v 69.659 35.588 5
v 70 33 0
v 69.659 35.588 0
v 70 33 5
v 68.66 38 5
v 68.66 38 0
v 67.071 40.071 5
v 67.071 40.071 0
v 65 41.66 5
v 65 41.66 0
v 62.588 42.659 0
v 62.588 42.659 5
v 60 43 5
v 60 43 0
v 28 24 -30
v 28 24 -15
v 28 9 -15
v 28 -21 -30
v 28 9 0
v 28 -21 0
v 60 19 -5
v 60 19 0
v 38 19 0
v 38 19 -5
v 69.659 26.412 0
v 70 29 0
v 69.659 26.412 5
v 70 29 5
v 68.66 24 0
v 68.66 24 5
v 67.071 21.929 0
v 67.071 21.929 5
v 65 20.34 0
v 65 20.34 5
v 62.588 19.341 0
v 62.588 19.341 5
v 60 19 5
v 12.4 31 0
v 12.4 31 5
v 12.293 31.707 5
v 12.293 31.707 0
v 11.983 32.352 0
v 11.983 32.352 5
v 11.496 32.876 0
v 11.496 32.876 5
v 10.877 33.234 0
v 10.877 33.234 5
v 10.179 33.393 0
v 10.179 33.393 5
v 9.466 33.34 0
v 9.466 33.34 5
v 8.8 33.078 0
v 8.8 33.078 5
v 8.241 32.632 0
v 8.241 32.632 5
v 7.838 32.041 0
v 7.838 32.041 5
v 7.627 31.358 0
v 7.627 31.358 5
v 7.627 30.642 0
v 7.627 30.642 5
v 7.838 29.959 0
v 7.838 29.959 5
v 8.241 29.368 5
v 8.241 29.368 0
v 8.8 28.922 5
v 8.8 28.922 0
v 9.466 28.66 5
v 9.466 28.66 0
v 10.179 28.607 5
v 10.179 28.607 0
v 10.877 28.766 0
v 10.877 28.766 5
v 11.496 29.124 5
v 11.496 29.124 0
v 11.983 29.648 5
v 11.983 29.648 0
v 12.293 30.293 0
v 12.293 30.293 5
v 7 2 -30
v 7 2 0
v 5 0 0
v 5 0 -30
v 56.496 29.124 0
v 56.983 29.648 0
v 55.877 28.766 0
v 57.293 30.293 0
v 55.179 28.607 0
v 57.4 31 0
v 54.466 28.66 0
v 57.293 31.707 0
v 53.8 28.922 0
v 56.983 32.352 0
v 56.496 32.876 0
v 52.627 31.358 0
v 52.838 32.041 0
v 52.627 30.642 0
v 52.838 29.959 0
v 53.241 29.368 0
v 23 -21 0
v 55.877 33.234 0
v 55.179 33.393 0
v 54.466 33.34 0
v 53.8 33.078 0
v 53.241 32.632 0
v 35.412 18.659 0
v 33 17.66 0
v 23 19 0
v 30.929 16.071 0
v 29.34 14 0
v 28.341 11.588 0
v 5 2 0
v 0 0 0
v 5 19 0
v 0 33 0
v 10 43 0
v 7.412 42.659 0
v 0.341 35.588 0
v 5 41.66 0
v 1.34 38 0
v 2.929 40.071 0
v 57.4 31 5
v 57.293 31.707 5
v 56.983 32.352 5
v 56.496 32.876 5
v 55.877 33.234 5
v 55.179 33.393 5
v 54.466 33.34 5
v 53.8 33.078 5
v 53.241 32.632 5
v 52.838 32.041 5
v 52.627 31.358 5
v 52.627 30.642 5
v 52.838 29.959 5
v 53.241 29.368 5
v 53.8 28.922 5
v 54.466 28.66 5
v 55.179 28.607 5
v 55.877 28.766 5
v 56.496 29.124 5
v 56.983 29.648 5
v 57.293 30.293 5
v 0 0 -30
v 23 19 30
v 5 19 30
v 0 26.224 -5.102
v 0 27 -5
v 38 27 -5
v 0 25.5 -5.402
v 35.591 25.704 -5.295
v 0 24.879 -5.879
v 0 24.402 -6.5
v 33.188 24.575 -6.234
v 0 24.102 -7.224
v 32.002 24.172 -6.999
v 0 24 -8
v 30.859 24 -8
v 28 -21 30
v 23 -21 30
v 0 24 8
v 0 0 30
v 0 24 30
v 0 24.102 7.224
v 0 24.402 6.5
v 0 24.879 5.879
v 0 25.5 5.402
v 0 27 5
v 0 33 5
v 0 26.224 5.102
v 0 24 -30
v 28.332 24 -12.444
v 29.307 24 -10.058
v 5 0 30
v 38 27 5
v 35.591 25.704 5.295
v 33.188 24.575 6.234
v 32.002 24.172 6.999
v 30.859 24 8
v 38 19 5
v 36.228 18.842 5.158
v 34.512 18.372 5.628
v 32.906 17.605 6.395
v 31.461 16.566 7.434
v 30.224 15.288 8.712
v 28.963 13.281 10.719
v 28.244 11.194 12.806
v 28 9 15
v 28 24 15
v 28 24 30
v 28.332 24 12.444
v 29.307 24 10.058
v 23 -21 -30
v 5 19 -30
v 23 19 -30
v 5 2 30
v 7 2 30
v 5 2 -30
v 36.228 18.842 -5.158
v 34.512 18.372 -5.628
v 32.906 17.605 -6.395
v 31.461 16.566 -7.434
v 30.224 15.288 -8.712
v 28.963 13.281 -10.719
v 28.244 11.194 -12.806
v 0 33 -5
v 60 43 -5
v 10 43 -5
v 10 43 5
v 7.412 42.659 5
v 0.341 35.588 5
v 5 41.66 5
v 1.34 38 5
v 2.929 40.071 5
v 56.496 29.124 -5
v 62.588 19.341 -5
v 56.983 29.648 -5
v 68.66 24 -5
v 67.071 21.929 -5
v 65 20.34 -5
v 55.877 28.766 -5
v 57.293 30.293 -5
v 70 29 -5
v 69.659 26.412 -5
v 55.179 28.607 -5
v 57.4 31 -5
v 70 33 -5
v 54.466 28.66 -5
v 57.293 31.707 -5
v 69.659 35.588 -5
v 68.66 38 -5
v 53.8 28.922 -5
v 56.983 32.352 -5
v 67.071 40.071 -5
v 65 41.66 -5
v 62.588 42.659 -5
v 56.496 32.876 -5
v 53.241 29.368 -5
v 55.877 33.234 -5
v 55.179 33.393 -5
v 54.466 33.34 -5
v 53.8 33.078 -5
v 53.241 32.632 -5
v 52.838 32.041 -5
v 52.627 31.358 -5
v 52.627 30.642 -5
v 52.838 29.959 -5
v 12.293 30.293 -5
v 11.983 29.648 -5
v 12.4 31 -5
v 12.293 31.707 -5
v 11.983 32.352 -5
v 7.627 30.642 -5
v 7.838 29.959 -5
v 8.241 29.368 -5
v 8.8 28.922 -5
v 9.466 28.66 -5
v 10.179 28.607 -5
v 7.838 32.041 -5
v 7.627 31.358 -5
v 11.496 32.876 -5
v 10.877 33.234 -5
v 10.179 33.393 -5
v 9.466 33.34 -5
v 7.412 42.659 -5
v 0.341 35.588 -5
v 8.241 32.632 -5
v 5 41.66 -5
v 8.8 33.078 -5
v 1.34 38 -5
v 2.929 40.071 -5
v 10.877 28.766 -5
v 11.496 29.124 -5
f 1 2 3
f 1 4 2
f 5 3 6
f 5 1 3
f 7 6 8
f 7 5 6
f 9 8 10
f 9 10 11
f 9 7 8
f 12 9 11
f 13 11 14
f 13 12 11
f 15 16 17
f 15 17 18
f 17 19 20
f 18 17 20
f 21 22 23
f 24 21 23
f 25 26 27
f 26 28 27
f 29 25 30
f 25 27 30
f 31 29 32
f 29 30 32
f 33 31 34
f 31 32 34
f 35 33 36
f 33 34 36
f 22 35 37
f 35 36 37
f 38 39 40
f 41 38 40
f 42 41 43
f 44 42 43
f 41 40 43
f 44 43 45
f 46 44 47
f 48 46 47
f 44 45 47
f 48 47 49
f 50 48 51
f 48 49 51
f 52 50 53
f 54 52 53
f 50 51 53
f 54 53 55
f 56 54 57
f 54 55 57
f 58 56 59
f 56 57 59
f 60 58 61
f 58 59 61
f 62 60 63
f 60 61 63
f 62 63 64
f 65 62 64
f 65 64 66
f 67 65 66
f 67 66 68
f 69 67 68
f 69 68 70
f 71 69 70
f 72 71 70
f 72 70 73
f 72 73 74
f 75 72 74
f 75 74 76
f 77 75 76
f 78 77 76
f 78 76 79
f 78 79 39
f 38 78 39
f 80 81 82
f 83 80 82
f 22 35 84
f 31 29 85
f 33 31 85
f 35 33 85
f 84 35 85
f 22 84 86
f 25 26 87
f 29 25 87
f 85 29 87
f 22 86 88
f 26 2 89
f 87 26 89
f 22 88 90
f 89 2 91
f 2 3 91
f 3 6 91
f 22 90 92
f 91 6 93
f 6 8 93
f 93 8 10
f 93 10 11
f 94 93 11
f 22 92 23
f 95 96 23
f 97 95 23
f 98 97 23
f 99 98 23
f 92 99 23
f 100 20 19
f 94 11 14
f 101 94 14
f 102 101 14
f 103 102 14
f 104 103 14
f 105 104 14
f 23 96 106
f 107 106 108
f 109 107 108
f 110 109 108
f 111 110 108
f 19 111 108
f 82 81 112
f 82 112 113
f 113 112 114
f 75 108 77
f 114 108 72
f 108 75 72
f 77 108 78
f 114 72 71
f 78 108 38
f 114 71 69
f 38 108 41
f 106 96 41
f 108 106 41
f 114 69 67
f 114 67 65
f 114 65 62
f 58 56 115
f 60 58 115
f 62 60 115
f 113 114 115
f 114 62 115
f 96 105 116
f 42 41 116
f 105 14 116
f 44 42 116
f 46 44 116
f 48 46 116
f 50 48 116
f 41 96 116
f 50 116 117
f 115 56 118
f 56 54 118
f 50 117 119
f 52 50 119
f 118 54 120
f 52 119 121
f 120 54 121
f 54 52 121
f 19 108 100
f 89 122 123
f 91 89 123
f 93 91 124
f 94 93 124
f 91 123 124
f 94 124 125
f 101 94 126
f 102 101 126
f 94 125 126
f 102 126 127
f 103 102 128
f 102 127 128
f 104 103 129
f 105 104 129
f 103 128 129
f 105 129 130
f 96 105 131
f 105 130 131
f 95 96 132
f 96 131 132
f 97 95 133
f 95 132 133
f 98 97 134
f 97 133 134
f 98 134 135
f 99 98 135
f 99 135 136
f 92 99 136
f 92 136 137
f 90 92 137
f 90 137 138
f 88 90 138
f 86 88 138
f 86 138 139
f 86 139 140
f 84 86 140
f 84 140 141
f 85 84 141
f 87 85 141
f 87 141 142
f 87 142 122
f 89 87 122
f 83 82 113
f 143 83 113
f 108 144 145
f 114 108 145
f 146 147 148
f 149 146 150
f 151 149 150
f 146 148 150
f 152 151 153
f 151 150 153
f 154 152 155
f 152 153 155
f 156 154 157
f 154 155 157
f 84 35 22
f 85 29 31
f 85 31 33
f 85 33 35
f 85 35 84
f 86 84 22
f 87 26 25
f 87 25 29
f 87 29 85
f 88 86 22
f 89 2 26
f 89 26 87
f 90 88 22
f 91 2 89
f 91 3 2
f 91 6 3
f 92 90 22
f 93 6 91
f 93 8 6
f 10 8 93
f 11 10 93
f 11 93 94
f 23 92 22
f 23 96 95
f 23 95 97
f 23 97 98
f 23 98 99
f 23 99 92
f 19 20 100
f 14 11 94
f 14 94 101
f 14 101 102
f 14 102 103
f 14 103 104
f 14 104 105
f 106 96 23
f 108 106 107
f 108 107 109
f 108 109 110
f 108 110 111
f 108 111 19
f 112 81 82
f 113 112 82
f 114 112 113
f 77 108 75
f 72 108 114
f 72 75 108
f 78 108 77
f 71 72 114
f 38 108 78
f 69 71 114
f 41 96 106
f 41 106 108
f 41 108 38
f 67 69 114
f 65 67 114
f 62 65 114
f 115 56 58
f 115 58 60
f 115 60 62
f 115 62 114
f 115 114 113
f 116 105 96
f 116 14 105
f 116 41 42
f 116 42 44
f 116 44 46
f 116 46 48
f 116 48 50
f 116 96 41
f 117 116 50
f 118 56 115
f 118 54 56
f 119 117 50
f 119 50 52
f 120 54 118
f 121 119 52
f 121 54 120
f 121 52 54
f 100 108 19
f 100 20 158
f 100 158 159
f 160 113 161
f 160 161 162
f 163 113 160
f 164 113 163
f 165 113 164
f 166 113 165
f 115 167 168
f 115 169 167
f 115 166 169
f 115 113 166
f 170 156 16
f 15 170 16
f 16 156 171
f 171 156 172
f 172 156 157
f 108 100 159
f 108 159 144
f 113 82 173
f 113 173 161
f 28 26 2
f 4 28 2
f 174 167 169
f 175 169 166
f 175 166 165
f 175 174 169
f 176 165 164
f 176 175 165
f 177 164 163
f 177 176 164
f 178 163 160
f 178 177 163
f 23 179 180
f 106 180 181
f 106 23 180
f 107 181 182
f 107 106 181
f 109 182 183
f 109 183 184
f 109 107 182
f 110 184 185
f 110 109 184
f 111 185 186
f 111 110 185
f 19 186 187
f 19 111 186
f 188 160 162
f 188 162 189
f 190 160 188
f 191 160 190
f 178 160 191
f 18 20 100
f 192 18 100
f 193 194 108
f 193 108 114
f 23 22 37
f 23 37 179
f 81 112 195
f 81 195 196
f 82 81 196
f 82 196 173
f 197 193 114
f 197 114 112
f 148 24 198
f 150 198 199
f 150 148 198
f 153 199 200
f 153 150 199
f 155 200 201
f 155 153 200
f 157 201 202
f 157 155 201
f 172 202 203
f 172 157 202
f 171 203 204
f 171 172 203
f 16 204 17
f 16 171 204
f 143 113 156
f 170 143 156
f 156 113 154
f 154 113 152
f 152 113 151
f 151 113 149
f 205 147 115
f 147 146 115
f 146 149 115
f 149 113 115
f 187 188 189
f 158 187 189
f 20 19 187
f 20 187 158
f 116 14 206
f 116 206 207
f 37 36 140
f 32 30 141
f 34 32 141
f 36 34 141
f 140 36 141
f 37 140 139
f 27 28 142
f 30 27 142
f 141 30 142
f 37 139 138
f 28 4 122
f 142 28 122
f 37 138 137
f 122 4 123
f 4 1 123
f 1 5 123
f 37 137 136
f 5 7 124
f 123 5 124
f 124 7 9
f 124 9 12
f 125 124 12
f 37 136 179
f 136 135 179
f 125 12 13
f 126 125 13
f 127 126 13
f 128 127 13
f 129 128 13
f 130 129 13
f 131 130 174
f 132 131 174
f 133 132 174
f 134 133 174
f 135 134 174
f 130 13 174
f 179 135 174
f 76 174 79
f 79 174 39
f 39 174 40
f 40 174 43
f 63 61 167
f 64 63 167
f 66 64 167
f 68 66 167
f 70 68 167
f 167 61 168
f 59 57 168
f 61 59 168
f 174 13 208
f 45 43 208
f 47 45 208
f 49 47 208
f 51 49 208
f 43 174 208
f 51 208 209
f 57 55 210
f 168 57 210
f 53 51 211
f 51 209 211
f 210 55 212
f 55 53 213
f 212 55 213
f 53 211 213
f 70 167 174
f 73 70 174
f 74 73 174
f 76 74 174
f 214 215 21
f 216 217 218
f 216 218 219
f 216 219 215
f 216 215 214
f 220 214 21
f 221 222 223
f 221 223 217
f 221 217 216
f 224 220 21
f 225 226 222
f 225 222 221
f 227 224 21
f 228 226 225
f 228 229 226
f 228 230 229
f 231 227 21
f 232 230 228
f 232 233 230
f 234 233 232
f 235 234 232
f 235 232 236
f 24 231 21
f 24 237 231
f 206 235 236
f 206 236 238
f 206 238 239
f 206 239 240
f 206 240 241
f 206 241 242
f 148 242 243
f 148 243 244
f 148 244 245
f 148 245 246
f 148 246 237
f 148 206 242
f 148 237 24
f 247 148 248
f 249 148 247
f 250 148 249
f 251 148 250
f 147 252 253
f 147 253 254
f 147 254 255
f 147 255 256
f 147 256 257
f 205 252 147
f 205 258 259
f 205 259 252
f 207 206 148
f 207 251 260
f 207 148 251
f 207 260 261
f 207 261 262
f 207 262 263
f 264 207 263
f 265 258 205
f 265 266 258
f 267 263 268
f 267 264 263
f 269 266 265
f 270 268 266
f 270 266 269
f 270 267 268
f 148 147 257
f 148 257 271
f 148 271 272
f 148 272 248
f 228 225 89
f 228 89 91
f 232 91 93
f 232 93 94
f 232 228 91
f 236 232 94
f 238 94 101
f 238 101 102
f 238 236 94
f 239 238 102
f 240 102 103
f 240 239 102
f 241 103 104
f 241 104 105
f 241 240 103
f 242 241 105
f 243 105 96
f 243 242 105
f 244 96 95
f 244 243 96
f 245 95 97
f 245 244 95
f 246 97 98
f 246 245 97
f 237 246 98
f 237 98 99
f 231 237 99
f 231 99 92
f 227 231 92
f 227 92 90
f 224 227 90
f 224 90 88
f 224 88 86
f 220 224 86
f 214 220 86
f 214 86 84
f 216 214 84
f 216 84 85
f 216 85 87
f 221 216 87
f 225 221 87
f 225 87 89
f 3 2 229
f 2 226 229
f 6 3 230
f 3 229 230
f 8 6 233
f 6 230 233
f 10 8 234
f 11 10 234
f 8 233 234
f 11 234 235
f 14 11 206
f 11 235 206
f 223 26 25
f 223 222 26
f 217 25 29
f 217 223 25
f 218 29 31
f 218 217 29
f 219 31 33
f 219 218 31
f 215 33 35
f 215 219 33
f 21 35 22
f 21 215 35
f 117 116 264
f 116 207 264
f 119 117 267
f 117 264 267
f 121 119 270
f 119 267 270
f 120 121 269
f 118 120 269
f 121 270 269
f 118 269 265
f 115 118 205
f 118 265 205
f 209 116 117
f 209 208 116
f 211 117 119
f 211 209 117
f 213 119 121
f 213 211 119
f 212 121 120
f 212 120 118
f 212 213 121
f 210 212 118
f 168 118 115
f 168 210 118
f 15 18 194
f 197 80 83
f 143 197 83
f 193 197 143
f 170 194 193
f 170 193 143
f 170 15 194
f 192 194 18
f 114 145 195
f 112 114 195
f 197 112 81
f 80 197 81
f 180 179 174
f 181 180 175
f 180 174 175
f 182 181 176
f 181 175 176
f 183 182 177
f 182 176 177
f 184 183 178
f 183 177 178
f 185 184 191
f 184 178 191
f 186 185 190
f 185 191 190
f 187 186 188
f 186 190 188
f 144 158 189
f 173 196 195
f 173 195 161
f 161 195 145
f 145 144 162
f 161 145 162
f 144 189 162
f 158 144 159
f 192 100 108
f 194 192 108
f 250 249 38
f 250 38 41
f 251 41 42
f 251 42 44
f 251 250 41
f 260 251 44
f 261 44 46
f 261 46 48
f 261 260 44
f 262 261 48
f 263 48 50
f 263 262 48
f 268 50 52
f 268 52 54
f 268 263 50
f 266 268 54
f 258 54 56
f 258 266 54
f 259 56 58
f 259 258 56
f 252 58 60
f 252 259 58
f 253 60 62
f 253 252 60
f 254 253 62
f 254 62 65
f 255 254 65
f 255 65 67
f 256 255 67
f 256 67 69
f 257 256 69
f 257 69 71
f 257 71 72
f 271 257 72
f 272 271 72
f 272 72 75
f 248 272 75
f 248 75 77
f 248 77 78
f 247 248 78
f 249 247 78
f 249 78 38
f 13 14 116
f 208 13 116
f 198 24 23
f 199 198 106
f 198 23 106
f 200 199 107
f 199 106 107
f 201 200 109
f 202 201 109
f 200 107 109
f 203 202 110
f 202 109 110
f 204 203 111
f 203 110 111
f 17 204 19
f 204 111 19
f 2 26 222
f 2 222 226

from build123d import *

# Parameters (mm, degrees)
BOSS_EXTRUDE1_DEPTH  = 30
SKETCH2_W            = 70
SKETCH2_H            = 24
BOSS_EXTRUDE2_DEPTH  = 5
M4_CLEARANCE_HOLE1_D = 4.8
FILLET1_R            = 10
FILLET2_R            = 3


with BuildPart() as part:
    # Sketch1 → Boss-Extrude1 (new body)
    with BuildSketch(Plane.XY):
        Polygon((0, 0), (0, 24), (28, 24), (28, -21), (23, -21), (23, 19), (5, 19), (5, 2), (7, 2), (5, 0), align=None)
    extrude(amount=BOSS_EXTRUDE1_DEPTH)

    # Sketch2 → Boss-Extrude2 (add)
    with BuildSketch(Plane(origin=(0, 0, 0), x_dir=(-1, 0, 0), z_dir=(0, 0, -1))):
        with Locations((-35, 31)):
            Rectangle(SKETCH2_W, SKETCH2_H)
    extrude(amount=-BOSS_EXTRUDE2_DEPTH)

    # M4 Clearance Hole1 (through all)
    with Locations(Plane(origin=(0, 0, 0), x_dir=(-1, 0, 0), z_dir=(0, 0, -1))):
        with Locations((-10, 31), (-55, 31)):
            Hole(M4_CLEARANCE_HOLE1_D / 2)

    # Fillet1
    fillet1_edges = [part.edges().sort_by_distance(p)[0] for p in [
        (28, 21.5, 5),
        (0, 43, 2.5),
        (28, 19, 2.5),
        (70, 19, 2.5),
        (70, 43, 2.5),
    ]]
    fillet(fillet1_edges, radius=FILLET1_R)

    # Fillet2
    fillet2_edges = [part.edges().sort_by_distance(p)[0] for p in [
        (19, 24, 5),
    ]]
    fillet(fillet2_edges, radius=FILLET2_R)


with BuildPart() as body_2:
    # Mirror1: mirrored copy
    add(part.part.mirror(Plane(origin=(0, 0, 0), x_dir=(1, 0, 0), z_dir=(0, 0, -1))))


solid = Compound([part.part, body_2.part])
